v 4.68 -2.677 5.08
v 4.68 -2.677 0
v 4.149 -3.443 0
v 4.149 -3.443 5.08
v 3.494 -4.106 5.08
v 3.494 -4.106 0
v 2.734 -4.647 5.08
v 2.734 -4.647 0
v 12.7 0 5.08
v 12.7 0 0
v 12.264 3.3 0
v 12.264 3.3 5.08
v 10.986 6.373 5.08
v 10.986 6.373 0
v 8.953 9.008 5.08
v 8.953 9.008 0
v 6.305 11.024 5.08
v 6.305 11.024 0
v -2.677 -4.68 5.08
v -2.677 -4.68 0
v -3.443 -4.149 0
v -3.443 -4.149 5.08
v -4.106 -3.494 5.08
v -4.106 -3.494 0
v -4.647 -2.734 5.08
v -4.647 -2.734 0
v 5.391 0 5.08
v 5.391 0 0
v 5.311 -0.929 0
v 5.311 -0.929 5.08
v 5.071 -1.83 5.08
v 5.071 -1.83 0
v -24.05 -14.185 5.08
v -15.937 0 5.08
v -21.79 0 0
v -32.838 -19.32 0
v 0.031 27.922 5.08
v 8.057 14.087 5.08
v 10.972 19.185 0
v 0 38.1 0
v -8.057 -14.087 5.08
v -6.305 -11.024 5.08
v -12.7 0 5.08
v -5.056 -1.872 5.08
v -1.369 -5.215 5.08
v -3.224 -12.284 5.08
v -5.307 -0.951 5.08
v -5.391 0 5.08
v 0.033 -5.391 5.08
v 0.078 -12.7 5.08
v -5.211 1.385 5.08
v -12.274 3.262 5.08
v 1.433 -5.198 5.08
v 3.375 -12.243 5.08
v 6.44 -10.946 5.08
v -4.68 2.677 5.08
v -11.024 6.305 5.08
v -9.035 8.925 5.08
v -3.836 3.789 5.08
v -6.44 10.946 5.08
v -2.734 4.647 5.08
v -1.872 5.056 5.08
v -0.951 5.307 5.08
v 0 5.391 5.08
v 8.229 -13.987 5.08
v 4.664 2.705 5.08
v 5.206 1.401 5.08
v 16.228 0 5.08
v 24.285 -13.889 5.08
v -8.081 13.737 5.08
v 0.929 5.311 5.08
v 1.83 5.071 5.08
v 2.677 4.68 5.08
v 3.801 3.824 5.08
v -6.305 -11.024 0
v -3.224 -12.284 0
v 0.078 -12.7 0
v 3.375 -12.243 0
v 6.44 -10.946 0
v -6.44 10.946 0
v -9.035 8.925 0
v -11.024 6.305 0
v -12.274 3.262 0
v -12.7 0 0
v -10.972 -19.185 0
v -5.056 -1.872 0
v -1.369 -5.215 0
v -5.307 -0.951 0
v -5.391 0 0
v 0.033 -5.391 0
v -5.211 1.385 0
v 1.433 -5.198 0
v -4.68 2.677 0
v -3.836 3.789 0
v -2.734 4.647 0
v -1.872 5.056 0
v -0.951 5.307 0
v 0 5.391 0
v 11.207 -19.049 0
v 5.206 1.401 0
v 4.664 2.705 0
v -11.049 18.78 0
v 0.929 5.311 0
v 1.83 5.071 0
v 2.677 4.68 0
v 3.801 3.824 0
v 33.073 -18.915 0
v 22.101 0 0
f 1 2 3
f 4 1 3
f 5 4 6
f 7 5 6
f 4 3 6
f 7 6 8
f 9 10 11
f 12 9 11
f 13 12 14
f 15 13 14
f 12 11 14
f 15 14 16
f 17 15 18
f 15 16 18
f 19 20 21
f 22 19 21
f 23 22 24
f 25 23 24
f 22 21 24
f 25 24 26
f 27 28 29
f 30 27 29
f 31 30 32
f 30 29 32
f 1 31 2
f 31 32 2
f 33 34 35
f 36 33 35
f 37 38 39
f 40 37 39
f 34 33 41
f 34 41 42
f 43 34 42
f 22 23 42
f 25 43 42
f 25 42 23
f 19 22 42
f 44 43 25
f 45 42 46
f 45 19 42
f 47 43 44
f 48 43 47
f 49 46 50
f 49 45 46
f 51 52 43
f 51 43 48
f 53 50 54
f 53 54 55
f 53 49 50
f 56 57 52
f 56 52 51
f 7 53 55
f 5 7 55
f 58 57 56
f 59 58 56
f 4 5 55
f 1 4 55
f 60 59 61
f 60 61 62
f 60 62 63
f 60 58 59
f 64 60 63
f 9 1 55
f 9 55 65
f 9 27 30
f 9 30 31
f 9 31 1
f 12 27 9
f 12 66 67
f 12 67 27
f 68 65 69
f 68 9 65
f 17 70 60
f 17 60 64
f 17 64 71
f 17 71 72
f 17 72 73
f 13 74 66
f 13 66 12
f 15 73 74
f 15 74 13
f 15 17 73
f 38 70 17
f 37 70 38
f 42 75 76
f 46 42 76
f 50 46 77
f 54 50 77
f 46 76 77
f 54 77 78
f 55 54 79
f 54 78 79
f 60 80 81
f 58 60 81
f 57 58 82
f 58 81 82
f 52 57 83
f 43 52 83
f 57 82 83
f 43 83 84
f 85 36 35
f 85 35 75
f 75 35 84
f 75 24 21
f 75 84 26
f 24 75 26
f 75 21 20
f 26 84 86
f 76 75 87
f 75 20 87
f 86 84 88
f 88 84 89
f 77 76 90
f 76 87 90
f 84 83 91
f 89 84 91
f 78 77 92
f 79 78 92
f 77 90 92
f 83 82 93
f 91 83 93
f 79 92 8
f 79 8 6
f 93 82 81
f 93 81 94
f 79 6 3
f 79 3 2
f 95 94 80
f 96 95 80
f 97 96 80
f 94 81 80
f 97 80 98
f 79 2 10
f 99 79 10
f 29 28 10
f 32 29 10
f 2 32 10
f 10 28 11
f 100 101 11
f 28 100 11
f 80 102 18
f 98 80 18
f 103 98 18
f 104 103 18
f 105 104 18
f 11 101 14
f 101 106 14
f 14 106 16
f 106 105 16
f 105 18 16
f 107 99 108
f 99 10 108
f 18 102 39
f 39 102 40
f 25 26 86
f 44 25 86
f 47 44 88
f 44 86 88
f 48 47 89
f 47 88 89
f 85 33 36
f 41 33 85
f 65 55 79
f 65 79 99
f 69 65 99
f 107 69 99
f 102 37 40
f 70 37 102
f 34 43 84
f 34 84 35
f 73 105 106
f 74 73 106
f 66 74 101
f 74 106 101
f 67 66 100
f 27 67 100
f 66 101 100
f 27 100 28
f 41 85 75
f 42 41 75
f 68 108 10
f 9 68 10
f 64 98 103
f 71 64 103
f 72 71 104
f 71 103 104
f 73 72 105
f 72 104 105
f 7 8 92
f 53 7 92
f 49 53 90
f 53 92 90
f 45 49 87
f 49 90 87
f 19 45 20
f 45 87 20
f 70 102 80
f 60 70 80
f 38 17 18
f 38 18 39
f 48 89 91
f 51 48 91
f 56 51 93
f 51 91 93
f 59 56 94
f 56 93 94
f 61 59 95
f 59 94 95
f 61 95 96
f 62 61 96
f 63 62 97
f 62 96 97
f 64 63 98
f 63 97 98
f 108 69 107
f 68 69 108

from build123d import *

# Parameters (mm, degrees)
F1_DEPTH = 5.08
F2_SIZE  = 5.07999


# Not quite as in the source:
# - a fillet or chamfer is up to 0.001 mm smaller than in the source, because OpenCascade refuses the exact size


with BuildPart() as f1:
    # F0 (on Top) → F1 (new body)
    with BuildSketch(Plane.XY):
        with BuildLine():
            ThreePointArc((-6.4398498965, 10.9461560975), (-3.3372007403, 12.2536970429), (0, 12.7))
            Line((0, 12.7), (0, 38.1))
            Line((0, 38.1), (-11.0489271221, 18.7804503105))
            Line((-11.0489271221, 18.7804503105), (-6.4398498965, 10.9461560975))
        make_face()
        with BuildLine():
            ThreePointArc((0, 12.7), (3.261881723, 12.2739613665), (6.304915, 11.0244295473))
            Line((6.304915, 11.0244295473), (10.9721234563, 19.185255))
            Line((10.9721234563, 19.185255), (0, 38.1))
            Line((0, 38.1), (0, 12.7))
        make_face()
        with BuildLine():
            ThreePointArc((-2.7338674235, 4.6469001683), (-1.4167200379, 5.2019819875), (0, 5.3914480674))
            Line((0, 5.3914480674), (0, 12.7))
            ThreePointArc((0, 12.7), (-3.3372007403, 12.2536970429), (-6.4398498965, 10.9461560975))
            Line((-6.4398498965, 10.9461560975), (-2.7338674235, 4.6469001683))
        make_face()
        with BuildLine():
            ThreePointArc((0, 5.3914480674), (1.3847453474, 5.2105846684), (2.6765843931, 4.6801290848))
            Line((2.6765843931, 4.6801290848), (6.304915, 11.0244295473))
            ThreePointArc((6.304915, 11.0244295473), (3.261881723, 12.2739613665), (0, 12.7))
            Line((0, 12.7), (0, 5.3914480674))
        make_face()
        with BuildLine():
            ThreePointArc((-5.3914480674, 0), (-4.6801290848, 2.6765843931), (-2.7338674235, 4.6469001683))
            Line((-2.7338674235, 4.6469001683), (-6.4398498965, 10.9461560975))
            ThreePointArc((-6.4398498965, 10.9461560975), (-11.0244295473, 6.304915), (-12.7, 0))
            Line((-12.7, 0), (-5.3914480674, 0))
        make_face()
        with BuildLine():
            ThreePointArc((2.6765843931, 4.6801290848), (4.6636025783, 2.7052769276), (5.3914480674, 0))
            Line((5.3914480674, 0), (12.7, 0))
            ThreePointArc((12.7, 0), (10.9855, 6.3725026285), (6.304915, 11.0244295473))
            Line((6.304915, 11.0244295473), (2.6765843931, 4.6801290848))
        make_face()
        with BuildLine():
            Line((-10.9461560975, -6.4398498965), (-4.6469001683, -2.7338674235))
            ThreePointArc((-4.6469001683, -2.7338674235), (-5.2019819875, -1.4167200379), (-5.3914480674, 0))
            Line((-5.3914480674, 0), (-12.7, 0))
            ThreePointArc((-12.7, 0), (-12.2536970429, -3.3372007403), (-10.9461560975, -6.4398498965))
        make_face()
        with BuildLine():
            Line((12.7, 0), (5.3914480674, 0))
            ThreePointArc((5.3914480674, 0), (5.2105846684, -1.3847453474), (4.6801290848, -2.6765843931))
            Line((4.6801290848, -2.6765843931), (11.0244295473, -6.304915))
            ThreePointArc((11.0244295473, -6.304915), (12.2739613665, -3.261881723), (12.7, 0))
        make_face()
        with BuildLine():
            Line((11.0244295473, -6.304915), (4.6801290848, -2.6765843931))
            ThreePointArc((4.6801290848, -2.6765843931), (3.835671013, -3.7888441699), (2.7338674235, -4.6469001683))
            Line((2.7338674235, -4.6469001683), (6.4398498965, -10.9461560975))
            ThreePointArc((6.4398498965, -10.9461560975), (9.0352390037, -8.9249345178), (11.0244295473, -6.304915))
        make_face()
        with BuildLine():
            Line((6.4398498965, -10.9461560975), (2.7338674235, -4.6469001683))
            ThreePointArc((2.7338674235, -4.6469001683), (0.0331115783, -5.3913463891), (-2.6765843931, -4.6801290848))
            Line((-2.6765843931, -4.6801290848), (-6.304915, -11.0244295473))
            ThreePointArc((-6.304915, -11.0244295473), (0.07799705, -12.6997604883), (6.4398498965, -10.9461560975))
        make_face()
        with BuildLine():
            ThreePointArc((-2.6765843931, -4.6801290848), (-3.7888441699, -3.835671013), (-4.6469001683, -2.7338674235))
            Line((-4.6469001683, -2.7338674235), (-10.9461560975, -6.4398498965))
            ThreePointArc((-10.9461560975, -6.4398498965), (-8.9249345178, -9.0352390037), (-6.304915, -11.0244295473))
            Line((-6.304915, -11.0244295473), (-2.6765843931, -4.6801290848))
        make_face()
        with BuildLine():
            Line((-32.8384682925, -19.3195496895), (-10.9461560975, -6.4398498965))
            ThreePointArc((-10.9461560975, -6.4398498965), (-12.2536970429, -3.3372007403), (-12.7, 0))
            Line((-12.7, 0), (-21.7895411704, 0))
            Line((-21.7895411704, 0), (-32.8384682925, -19.3195496895))
        make_face()
        with BuildLine():
            ThreePointArc((-6.304915, -11.0244295473), (-8.9249345178, -9.0352390037), (-10.9461560975, -6.4398498965))
            Line((-10.9461560975, -6.4398498965), (-32.8384682925, -19.3195496895))
            Line((-32.8384682925, -19.3195496895), (-10.9721234563, -19.185255))
            Line((-10.9721234563, -19.185255), (-6.304915, -11.0244295473))
        make_face()
        with BuildLine():
            Line((33.0732886418, -18.914745), (11.0244295473, -6.304915))
            ThreePointArc((11.0244295473, -6.304915), (9.0352390037, -8.9249345178), (6.4398498965, -10.9461560975))
            Line((6.4398498965, -10.9461560975), (11.2069438057, -19.0490396895))
            Line((11.2069438057, -19.0490396895), (33.0732886418, -18.914745))
        make_face()
        with BuildLine():
            Line((22.1011651855, 0), (12.7, 0))
            ThreePointArc((12.7, 0), (12.2739613665, -3.261881723), (11.0244295473, -6.304915))
            Line((11.0244295473, -6.304915), (33.0732886418, -18.914745))
            Line((33.0732886418, -18.914745), (22.1011651855, 0))
        make_face()
    extrude(amount=F1_DEPTH)

    # F2 (size 5.08 in the source; OpenCascade refuses exactly that, so slightly less here)
    f2_edges = [f1.edges().sort_by_distance(p)[0] for p in [
        (-5.524464, 28.440225, 5.08),
        (5.486062, 28.642628, 5.08),
        (-27.314005, -9.659775, 5.08),
        (-21.905296, -19.252402, 5.08),
        (22.140116, -18.981892, 5.08),
        (27.587227, -9.457373, 5.08),
    ]]
    chamfer(f2_edges, length=F2_SIZE)


solid = f1.part
